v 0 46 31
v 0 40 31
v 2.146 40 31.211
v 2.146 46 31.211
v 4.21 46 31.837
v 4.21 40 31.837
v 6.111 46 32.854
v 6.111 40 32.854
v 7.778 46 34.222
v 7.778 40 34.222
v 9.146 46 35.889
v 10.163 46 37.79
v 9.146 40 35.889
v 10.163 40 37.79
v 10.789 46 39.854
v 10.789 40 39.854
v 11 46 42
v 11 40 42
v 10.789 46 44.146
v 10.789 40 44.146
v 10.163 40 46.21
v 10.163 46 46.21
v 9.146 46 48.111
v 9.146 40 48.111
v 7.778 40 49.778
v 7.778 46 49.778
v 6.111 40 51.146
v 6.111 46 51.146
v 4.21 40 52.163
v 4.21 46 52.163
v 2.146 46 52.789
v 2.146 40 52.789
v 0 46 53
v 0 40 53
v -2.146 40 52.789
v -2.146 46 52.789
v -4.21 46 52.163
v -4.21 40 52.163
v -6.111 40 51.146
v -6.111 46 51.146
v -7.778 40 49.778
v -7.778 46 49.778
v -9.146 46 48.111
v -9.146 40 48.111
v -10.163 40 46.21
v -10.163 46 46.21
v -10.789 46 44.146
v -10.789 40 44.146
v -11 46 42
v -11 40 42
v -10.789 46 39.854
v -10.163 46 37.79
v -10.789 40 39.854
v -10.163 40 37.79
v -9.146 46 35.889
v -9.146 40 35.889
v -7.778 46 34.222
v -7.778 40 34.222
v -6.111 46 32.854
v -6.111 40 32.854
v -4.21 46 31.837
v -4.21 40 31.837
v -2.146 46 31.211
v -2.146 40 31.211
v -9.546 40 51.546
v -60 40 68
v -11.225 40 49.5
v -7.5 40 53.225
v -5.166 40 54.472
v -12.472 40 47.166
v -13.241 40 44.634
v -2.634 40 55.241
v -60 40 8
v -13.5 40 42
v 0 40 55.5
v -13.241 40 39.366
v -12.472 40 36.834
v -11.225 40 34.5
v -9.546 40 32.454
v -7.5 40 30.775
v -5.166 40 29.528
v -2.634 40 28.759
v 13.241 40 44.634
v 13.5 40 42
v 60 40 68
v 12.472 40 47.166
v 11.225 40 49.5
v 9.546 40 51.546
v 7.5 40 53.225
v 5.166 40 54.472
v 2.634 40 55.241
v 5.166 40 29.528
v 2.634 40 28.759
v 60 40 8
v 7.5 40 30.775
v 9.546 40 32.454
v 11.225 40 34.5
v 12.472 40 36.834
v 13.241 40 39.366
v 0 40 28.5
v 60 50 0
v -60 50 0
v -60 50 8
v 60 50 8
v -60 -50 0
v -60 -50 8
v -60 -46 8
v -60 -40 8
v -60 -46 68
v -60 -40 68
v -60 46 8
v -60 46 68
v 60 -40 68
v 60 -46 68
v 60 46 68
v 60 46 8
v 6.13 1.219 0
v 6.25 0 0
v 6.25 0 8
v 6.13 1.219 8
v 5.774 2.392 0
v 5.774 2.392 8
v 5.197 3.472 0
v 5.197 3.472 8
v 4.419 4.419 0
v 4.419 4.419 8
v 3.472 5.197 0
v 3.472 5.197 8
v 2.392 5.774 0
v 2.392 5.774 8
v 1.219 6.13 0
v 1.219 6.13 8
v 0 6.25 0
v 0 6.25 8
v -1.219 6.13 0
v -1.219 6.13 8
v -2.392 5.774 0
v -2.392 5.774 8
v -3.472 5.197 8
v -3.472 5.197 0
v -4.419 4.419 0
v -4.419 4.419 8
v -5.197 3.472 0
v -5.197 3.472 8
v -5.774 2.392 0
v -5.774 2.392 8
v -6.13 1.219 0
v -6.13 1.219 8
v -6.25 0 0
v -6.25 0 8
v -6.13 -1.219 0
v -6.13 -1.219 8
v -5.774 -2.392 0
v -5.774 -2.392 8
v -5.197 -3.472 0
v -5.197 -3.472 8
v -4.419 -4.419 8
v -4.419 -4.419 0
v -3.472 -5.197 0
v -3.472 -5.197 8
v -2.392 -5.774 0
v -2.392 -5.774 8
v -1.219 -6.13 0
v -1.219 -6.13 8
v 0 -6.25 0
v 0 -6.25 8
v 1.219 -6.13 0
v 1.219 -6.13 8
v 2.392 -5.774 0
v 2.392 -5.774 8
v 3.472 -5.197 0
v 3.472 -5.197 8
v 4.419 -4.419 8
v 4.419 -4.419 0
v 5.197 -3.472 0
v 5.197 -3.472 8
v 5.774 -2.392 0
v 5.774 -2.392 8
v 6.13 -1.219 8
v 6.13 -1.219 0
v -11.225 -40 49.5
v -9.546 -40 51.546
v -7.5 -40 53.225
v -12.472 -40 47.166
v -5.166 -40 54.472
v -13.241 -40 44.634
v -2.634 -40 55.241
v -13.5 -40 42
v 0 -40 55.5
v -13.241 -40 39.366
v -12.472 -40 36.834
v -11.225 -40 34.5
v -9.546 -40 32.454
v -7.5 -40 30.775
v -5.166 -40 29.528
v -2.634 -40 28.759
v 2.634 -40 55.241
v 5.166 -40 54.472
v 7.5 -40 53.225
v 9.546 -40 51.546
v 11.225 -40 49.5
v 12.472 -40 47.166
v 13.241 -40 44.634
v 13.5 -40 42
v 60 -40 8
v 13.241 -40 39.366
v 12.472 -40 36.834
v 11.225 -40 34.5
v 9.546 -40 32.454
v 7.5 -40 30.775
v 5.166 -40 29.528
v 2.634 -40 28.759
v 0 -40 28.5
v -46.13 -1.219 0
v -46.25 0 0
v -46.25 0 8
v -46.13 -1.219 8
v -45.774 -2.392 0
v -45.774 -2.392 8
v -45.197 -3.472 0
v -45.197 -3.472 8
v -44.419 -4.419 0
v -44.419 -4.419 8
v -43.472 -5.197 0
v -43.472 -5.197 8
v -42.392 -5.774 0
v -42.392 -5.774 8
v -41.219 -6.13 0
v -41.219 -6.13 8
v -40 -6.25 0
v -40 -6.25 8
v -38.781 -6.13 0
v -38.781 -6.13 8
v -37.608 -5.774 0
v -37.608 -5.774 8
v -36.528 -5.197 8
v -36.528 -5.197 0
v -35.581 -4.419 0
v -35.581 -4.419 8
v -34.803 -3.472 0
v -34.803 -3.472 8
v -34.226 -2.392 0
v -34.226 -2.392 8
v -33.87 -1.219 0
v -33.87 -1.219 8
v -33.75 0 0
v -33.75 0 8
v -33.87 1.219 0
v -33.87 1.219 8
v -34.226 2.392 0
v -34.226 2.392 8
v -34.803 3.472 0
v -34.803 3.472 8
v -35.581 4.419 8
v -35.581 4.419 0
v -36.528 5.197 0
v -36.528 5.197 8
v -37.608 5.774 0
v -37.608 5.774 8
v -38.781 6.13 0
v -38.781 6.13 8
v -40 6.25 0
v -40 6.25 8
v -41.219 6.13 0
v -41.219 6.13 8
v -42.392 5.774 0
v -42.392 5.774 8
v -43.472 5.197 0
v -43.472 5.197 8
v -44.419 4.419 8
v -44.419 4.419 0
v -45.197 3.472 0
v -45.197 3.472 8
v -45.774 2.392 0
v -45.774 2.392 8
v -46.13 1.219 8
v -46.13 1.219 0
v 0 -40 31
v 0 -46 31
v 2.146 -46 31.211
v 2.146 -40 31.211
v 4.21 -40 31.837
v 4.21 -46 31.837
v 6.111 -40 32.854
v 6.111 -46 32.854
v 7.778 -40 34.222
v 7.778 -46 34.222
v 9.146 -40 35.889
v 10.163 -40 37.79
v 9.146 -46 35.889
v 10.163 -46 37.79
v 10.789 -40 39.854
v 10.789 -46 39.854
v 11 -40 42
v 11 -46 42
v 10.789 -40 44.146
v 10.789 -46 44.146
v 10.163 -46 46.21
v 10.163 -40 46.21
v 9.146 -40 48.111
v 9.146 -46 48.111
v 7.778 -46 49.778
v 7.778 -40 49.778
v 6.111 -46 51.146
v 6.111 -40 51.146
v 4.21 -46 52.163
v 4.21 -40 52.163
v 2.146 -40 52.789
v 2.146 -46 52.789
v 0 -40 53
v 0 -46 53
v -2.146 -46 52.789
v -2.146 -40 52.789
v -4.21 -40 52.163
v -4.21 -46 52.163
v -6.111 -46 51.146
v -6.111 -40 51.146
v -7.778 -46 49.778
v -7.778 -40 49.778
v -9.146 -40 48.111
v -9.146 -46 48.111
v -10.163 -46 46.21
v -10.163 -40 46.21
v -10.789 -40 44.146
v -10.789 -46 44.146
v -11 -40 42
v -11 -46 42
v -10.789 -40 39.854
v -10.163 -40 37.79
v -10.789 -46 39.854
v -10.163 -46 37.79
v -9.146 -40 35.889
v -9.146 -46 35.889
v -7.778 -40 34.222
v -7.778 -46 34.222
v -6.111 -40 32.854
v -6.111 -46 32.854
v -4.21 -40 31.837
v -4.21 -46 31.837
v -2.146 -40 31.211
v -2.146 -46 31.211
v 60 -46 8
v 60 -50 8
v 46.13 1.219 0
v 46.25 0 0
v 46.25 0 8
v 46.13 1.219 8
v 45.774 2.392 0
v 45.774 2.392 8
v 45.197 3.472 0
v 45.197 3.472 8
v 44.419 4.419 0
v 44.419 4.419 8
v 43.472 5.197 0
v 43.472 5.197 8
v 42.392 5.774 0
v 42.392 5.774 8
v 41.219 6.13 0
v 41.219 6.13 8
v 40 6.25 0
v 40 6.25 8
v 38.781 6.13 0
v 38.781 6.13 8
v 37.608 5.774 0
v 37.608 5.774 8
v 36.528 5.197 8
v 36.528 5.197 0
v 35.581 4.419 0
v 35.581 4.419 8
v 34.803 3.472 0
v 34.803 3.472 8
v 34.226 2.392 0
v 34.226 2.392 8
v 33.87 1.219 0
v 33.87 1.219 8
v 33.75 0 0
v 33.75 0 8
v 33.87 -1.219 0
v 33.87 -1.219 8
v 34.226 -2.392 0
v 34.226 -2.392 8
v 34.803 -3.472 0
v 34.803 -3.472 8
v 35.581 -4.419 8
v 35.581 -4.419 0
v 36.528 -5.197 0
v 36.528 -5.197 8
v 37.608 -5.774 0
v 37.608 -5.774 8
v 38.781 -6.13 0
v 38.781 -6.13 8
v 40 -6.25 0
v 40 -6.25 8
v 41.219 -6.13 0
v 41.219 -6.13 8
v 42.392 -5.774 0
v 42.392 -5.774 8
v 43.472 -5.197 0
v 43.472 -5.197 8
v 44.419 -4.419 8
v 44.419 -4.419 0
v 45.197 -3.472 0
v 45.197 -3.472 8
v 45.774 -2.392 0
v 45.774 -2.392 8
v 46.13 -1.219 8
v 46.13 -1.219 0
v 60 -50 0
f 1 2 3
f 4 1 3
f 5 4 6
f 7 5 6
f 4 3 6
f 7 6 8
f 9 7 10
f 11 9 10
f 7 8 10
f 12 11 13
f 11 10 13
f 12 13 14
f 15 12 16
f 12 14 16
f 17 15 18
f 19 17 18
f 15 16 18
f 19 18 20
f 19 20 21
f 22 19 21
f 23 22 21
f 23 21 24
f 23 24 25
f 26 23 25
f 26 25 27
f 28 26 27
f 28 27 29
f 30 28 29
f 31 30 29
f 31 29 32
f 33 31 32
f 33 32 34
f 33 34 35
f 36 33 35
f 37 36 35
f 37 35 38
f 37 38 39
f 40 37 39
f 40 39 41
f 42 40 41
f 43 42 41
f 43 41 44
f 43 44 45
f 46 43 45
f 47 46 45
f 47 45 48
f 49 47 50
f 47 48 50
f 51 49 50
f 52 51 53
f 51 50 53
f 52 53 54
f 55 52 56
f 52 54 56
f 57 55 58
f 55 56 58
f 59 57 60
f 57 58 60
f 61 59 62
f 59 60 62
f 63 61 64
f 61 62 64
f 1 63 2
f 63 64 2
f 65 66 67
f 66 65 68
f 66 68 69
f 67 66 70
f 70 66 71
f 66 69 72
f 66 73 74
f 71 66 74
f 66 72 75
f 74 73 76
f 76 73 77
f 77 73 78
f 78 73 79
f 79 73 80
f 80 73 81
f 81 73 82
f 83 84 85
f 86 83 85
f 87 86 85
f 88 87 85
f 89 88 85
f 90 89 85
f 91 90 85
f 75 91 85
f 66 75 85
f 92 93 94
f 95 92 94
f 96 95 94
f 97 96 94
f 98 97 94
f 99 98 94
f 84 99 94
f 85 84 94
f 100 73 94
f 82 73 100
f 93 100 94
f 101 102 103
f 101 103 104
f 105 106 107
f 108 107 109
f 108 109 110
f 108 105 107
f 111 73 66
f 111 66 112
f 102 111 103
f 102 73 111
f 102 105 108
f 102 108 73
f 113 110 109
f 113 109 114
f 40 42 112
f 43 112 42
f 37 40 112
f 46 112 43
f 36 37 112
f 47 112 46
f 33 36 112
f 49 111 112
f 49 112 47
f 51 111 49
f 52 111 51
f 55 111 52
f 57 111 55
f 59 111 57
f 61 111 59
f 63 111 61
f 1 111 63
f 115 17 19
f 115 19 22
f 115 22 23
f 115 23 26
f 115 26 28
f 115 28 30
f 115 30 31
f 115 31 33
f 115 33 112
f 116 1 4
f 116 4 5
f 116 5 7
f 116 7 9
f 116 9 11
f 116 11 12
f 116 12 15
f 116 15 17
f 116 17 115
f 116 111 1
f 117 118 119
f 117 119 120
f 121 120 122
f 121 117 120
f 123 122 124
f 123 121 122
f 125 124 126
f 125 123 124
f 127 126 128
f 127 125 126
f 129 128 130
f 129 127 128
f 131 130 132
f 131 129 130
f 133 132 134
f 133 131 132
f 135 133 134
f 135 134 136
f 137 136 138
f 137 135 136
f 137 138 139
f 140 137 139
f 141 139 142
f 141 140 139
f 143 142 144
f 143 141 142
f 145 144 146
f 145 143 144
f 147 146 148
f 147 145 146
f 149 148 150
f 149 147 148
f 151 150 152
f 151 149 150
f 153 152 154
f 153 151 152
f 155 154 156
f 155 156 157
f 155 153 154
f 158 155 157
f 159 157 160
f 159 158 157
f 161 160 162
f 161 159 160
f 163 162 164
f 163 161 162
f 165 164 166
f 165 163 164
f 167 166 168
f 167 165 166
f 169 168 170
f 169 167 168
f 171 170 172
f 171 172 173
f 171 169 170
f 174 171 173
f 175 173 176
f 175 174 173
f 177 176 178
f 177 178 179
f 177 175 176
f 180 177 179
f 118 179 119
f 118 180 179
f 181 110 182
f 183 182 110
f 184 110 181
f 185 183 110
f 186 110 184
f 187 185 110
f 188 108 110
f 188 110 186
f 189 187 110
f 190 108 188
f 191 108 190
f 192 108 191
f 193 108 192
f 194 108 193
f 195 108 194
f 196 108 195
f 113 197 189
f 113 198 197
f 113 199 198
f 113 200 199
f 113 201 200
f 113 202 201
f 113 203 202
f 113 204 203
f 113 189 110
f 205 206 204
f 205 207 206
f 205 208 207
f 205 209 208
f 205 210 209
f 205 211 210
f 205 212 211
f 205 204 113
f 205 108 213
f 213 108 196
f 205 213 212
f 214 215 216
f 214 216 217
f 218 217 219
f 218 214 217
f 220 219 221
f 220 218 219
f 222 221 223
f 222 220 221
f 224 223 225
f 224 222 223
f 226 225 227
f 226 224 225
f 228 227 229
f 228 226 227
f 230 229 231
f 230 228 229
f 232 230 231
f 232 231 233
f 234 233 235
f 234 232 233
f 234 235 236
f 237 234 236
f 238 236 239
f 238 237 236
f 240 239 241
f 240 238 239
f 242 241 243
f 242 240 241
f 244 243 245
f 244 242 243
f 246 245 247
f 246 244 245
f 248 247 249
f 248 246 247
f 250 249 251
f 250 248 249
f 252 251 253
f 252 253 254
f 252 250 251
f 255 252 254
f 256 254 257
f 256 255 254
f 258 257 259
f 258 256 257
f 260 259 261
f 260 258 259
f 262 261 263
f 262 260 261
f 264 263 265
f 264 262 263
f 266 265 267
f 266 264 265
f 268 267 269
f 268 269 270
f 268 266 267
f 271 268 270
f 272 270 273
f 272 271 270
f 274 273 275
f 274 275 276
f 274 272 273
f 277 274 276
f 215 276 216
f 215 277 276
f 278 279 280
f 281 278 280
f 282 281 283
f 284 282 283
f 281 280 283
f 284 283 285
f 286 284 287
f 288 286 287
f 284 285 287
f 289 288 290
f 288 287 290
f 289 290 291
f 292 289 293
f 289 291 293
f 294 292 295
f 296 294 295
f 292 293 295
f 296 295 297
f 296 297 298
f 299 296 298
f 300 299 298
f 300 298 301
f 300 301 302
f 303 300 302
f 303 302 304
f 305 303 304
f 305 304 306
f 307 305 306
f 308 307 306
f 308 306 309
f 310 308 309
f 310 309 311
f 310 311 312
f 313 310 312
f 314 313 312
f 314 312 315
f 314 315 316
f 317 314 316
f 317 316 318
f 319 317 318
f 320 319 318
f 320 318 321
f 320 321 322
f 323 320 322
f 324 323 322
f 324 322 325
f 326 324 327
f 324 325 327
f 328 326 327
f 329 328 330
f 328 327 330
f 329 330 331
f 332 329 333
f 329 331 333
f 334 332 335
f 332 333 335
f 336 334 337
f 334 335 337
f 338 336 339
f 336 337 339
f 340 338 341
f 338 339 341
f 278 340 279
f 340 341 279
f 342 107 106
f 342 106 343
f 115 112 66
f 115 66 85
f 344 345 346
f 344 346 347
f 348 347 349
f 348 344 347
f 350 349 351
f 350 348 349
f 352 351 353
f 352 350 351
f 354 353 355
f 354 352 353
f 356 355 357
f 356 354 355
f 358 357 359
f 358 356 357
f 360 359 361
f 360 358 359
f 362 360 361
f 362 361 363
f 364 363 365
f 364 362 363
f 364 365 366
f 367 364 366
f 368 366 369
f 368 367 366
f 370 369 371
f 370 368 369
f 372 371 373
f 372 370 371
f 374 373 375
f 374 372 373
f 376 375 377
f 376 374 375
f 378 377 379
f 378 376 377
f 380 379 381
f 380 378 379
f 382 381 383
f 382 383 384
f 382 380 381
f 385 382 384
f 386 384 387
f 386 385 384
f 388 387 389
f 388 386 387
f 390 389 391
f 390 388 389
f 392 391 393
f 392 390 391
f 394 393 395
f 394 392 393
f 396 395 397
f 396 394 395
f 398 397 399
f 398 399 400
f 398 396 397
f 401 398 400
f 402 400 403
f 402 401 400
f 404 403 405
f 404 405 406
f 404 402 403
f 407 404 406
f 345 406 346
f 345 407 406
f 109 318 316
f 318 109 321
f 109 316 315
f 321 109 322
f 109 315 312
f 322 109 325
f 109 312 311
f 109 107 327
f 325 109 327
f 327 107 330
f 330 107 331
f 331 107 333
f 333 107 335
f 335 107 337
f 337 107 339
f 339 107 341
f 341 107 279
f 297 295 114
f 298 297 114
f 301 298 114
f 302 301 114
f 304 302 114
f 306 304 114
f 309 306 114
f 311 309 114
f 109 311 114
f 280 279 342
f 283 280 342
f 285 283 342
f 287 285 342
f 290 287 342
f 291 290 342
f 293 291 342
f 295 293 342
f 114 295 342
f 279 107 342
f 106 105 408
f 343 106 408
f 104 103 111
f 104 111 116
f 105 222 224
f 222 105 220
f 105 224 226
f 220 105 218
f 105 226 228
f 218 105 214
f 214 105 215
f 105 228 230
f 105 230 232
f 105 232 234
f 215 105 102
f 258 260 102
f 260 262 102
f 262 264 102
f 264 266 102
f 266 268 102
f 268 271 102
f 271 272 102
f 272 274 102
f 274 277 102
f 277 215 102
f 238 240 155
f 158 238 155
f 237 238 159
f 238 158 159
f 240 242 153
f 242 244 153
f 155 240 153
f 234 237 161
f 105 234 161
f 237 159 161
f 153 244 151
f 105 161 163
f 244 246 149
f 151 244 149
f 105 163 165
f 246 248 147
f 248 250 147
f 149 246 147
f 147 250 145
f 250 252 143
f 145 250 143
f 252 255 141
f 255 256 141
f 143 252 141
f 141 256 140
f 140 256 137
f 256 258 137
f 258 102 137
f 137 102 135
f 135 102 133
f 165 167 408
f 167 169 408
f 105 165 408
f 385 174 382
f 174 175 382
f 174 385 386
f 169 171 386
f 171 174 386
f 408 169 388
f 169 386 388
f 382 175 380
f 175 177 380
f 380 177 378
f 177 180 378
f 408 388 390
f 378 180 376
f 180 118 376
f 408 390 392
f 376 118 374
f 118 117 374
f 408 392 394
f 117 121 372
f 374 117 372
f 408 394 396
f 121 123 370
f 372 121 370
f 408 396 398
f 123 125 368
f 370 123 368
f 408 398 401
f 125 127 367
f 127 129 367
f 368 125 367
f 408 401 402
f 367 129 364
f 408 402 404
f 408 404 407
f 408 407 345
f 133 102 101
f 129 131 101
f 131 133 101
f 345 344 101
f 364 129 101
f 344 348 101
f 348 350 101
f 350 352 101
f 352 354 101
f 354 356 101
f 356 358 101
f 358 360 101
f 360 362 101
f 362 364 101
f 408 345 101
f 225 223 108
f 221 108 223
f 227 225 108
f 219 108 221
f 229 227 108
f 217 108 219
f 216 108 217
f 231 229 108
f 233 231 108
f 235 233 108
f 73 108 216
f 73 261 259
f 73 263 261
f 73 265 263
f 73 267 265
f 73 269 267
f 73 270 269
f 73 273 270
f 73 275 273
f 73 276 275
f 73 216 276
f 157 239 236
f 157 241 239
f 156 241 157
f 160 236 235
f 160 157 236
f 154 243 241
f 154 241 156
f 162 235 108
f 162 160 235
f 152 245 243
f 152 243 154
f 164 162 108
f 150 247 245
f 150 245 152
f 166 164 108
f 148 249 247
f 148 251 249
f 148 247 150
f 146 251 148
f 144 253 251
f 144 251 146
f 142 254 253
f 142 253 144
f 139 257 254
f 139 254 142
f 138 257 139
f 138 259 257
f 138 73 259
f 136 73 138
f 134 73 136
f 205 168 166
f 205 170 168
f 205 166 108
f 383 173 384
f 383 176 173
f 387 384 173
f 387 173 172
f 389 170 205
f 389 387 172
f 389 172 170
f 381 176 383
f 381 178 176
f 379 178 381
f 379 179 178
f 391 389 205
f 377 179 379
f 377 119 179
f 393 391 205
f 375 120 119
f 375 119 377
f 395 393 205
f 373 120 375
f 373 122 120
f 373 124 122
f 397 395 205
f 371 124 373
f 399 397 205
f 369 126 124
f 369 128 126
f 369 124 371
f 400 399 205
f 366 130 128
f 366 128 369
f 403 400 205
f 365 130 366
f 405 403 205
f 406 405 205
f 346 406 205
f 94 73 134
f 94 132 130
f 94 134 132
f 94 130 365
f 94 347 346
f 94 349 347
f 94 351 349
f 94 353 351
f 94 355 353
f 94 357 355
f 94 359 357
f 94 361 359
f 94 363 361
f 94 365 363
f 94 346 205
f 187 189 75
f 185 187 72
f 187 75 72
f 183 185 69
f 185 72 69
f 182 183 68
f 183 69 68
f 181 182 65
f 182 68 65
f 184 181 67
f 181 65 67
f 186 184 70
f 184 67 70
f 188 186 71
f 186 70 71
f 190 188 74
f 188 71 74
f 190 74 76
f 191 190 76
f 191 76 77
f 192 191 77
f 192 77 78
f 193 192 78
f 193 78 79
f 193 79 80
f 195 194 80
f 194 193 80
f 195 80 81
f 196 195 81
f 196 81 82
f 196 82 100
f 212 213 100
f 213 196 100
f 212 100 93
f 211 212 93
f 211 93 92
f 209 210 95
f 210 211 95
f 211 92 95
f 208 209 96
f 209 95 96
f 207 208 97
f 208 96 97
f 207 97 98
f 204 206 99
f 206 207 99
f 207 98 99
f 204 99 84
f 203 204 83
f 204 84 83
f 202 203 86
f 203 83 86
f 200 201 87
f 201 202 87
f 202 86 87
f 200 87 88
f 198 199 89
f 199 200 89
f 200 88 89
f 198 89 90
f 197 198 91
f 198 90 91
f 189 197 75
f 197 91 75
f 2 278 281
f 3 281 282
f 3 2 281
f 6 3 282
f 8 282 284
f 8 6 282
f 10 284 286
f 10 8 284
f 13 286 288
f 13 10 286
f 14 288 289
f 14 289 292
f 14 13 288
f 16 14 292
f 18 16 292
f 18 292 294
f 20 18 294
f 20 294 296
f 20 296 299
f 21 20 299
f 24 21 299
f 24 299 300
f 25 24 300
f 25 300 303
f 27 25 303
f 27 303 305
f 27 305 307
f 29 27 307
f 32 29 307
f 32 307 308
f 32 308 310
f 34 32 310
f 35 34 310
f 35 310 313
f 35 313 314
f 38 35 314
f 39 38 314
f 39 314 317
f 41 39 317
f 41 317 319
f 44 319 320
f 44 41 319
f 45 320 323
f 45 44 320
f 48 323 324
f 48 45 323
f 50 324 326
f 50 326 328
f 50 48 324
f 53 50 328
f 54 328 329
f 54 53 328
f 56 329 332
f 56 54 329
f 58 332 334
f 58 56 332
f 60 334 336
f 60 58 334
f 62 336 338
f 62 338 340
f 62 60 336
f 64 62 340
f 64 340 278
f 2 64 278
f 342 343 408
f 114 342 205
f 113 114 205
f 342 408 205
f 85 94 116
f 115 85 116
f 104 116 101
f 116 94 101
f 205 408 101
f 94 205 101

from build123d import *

# Parameters (mm, degrees)
SKETCH_1_W          = 120
SKETCH_1_H          = 100
SKETCH_1_R          = 6.25
EXTRUDE_1_DEPTH     = 8
SKETCH_2_W          = 120
SKETCH_2_H          = 6
EXTRUDE_2_DEPTH     = 60
SKETCH_3_R          = 11
CUT_EXTRUDE_1_DEPTH = 133.060592154
EXTRUDE_3_REACH     = 129.765
SKETCH_4_R          = 13.5
SKETCH_4_R_2        = 11


with BuildPart() as part:
    # Эскиз1 → Бобышка-Вытянуть1 (new body)
    with BuildSketch(Plane.XY):
        Rectangle(SKETCH_1_W, SKETCH_1_H)
        Circle(SKETCH_1_R, mode=Mode.SUBTRACT)
        with Locations((40, 0)):
            Circle(SKETCH_1_R, mode=Mode.SUBTRACT)
        with Locations(Location((-40, 0, 0), (0, 0, 180))):
            Circle(SKETCH_1_R, mode=Mode.SUBTRACT)
    extrude(amount=EXTRUDE_1_DEPTH)

    # Эскиз2 → Бобышка-Вытянуть2 (add)
    with BuildSketch(Plane.XY.offset(8)):
        with Locations((0, -43)):
            Rectangle(SKETCH_2_W, SKETCH_2_H)
        with Locations((0, 43)):
            Rectangle(SKETCH_2_W, SKETCH_2_H)
    extrude(amount=EXTRUDE_2_DEPTH)

    # Эскиз3 → Вырез-Вытянуть1 (cut, through all)
    with BuildSketch(Plane.XZ.offset(46)):
        with Locations(Location((0, 42, 0), (0, 0, 270))):
            Circle(SKETCH_3_R)
    extrude(amount=-CUT_EXTRUDE_1_DEPTH, mode=Mode.SUBTRACT)

    # Эскиз4 → Бобышка-Вытянуть3 (add, up to next)
    with BuildSketch(Plane.XZ.offset(-40), mode=Mode.PRIVATE) as extrude_3_sk1:
        with Locations(Location((0, 42, 0), (0, 0, 90))):
            Circle(SKETCH_4_R)
        with Locations(Location((0, 42, 0), (0, 0, 270))):
            Circle(SKETCH_4_R_2, mode=Mode.SUBTRACT)
    extrude_3_tool1 = extrude(extrude_3_sk1.sketch, amount=EXTRUDE_3_REACH, mode=Mode.PRIVATE) - part.part
    add(extrude_3_tool1.solids().sort_by_distance((0, 40, 28.881838))[0])


solid = part.part
